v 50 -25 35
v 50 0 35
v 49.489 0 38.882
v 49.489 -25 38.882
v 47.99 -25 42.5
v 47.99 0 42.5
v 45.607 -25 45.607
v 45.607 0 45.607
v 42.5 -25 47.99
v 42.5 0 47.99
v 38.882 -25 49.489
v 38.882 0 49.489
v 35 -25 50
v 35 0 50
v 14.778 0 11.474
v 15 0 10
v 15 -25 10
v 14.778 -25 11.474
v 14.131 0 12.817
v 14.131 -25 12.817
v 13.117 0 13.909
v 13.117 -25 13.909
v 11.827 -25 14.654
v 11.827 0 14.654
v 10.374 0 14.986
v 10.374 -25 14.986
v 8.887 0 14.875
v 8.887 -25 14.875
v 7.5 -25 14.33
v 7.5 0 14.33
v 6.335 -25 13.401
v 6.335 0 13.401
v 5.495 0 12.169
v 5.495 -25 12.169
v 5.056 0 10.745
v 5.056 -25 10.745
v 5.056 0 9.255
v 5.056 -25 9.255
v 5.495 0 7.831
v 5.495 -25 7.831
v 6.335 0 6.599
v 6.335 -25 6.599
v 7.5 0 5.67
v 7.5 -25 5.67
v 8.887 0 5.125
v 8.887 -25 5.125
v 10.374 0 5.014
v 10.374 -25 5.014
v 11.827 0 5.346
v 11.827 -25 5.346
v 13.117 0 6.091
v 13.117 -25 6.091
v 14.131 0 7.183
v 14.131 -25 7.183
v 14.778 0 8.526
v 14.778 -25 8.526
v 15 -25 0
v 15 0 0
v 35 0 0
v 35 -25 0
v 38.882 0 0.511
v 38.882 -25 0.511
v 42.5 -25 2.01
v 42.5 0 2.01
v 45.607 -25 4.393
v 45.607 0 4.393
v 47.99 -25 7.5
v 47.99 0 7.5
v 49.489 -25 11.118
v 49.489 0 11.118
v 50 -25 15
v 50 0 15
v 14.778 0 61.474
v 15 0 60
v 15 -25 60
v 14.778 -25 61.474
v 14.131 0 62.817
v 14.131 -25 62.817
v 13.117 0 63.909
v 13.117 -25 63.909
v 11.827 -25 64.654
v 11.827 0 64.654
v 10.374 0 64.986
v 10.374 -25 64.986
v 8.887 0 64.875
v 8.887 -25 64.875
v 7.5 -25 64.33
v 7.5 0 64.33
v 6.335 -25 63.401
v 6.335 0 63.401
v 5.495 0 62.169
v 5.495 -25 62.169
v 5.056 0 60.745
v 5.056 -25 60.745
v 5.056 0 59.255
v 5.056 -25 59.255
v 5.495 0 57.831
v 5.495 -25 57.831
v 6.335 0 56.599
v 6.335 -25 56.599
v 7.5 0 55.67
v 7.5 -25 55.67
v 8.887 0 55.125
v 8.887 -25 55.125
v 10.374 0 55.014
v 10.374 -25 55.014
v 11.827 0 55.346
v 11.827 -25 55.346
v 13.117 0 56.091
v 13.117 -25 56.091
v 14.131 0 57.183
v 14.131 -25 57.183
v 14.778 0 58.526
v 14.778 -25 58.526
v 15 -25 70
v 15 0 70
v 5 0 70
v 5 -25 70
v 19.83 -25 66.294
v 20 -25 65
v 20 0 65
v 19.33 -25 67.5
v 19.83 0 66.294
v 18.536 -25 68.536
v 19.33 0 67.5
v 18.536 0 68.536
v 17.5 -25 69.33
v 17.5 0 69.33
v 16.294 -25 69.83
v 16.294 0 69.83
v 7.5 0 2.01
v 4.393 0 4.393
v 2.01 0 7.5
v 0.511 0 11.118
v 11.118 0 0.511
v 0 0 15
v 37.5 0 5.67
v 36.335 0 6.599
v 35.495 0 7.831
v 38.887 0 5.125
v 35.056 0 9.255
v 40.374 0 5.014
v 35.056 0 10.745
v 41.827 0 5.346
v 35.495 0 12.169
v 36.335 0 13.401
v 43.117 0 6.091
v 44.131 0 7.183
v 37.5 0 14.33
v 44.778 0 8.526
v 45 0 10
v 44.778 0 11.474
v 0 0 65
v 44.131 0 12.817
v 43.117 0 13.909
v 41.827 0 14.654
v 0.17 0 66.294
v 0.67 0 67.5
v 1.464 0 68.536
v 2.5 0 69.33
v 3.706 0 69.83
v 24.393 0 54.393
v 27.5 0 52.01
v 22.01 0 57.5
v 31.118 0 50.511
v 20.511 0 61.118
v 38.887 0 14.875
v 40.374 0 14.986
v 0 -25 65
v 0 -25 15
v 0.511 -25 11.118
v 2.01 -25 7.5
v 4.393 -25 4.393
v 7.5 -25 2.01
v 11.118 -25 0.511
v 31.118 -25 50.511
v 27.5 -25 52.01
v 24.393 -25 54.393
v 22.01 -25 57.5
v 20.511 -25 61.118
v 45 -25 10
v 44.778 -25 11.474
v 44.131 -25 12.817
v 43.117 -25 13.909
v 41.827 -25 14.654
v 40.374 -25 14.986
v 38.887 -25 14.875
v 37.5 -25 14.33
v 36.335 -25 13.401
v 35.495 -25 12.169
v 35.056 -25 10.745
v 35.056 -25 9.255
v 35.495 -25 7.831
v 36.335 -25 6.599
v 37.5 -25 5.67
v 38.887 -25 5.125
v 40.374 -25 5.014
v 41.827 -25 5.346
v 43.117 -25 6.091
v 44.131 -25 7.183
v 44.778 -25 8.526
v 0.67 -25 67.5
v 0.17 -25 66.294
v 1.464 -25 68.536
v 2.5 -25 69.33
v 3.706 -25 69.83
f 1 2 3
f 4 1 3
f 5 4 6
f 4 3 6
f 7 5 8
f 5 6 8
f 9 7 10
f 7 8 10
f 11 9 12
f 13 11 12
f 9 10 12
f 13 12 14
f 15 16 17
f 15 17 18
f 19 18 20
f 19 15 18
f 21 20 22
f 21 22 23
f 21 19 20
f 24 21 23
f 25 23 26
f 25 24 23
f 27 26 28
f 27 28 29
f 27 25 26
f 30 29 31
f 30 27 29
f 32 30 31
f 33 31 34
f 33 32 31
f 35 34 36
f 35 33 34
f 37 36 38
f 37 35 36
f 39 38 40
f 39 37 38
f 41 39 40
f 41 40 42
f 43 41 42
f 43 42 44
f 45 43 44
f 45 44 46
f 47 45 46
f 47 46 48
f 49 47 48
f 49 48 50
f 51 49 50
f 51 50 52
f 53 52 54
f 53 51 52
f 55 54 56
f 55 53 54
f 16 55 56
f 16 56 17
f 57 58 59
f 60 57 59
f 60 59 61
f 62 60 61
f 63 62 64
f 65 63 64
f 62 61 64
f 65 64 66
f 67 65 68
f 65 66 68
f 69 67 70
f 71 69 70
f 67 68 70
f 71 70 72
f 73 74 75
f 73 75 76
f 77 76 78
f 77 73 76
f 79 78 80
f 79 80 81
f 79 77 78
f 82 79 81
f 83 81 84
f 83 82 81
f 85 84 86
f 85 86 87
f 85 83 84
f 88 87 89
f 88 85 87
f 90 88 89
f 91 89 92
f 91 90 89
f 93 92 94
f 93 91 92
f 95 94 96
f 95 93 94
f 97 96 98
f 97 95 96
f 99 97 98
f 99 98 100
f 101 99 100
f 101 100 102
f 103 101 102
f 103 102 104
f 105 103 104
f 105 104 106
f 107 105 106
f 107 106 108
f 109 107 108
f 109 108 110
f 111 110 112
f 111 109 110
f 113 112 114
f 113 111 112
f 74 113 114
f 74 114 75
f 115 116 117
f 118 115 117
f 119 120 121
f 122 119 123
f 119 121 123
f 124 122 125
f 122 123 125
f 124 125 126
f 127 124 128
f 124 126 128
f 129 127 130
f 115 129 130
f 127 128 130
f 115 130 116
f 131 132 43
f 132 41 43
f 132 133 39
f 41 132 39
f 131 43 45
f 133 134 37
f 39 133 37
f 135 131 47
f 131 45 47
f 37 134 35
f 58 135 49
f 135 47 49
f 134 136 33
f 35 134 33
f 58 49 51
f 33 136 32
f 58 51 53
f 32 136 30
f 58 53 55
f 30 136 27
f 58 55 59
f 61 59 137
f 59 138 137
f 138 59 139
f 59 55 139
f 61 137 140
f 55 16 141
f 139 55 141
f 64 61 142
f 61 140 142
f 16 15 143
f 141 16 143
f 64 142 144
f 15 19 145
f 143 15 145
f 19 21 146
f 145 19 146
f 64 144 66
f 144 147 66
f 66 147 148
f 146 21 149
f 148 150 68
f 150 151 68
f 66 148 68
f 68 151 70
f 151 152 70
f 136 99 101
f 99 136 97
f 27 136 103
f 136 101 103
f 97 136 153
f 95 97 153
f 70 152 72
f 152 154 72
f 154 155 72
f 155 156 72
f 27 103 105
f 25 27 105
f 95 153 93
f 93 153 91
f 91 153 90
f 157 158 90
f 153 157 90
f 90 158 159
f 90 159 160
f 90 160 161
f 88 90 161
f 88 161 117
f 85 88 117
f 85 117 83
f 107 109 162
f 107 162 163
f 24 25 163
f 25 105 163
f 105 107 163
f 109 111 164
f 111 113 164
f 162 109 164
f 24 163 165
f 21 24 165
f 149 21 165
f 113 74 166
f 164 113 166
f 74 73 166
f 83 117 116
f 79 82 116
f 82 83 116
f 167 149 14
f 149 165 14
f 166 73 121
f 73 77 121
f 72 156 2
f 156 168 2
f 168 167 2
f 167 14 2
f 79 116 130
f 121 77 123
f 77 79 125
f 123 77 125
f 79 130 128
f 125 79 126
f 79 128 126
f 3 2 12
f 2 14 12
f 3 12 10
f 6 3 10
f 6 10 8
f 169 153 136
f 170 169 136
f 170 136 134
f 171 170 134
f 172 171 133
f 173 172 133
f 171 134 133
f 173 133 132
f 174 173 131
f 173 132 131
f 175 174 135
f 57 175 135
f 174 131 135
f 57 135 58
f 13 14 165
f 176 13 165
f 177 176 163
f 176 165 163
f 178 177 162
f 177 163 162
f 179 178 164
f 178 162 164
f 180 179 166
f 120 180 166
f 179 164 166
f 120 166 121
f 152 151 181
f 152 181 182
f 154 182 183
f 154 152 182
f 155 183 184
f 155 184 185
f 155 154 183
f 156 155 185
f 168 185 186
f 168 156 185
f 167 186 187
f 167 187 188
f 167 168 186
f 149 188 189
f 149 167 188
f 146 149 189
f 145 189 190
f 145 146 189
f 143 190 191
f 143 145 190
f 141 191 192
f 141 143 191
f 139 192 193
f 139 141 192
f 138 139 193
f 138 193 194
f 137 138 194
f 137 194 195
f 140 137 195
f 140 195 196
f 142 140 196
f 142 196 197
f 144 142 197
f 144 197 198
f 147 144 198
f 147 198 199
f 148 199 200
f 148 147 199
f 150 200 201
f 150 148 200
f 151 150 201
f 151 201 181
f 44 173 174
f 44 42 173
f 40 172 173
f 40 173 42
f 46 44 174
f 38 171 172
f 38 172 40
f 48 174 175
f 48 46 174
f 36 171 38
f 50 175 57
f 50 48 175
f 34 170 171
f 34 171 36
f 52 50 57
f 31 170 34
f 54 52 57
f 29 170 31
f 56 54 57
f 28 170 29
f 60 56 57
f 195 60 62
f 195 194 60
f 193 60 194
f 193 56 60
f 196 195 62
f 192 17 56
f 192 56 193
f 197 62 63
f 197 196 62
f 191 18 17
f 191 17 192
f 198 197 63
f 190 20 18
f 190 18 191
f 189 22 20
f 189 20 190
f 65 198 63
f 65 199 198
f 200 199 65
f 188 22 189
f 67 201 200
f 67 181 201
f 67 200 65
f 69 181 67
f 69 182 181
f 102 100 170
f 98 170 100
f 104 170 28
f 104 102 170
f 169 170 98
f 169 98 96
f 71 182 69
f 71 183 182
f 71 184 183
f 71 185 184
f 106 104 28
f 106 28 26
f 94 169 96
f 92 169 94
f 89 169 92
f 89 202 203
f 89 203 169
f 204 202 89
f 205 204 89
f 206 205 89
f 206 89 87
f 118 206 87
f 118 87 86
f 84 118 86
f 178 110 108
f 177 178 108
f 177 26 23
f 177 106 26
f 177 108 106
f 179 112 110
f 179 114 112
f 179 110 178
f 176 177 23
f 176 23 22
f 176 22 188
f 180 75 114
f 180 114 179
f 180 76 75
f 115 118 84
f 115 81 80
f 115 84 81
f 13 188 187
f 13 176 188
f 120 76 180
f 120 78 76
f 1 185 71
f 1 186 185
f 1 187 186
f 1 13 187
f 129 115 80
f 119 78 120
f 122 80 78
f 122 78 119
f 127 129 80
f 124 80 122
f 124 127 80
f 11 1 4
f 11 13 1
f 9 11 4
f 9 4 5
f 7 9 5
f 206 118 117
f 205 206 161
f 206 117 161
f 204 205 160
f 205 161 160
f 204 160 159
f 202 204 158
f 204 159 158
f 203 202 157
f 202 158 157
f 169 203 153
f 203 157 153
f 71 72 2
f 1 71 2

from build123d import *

# Parameters (mm, degrees)
F0_R     = 5
F1_DEPTH = 25


with BuildPart() as f1:
    # F0 (on Front) → F1 (new body)
    with BuildSketch(Plane.XZ):
        with BuildLine():
            ThreePointArc((0, 15), (4.393398, 4.393398), (15, 0))
            Line((15, 0), (35, 0))
            ThreePointArc((35, 0), (45.606602, 4.393398), (50, 15))
            Line((50, 15), (50, 35))
            ThreePointArc((50, 35), (45.606602, 45.606602), (35, 50))
            ThreePointArc((35, 50), (24.393398, 54.393398), (20, 65))
            ThreePointArc((20, 65), (18.535534, 68.535534), (15, 70))
            Line((15, 70), (5, 70))
            ThreePointArc((5, 70), (1.464466, 68.535534), (0, 65))
            Line((0, 65), (0, 15))
        make_face()
        with Locations((10, 10)):
            Circle(F0_R, mode=Mode.SUBTRACT)
        with Locations((40, 10)):
            Circle(F0_R, mode=Mode.SUBTRACT)
        with Locations((10, 60)):
            Circle(F0_R, mode=Mode.SUBTRACT)
    extrude(amount=F1_DEPTH)


solid = f1.part
